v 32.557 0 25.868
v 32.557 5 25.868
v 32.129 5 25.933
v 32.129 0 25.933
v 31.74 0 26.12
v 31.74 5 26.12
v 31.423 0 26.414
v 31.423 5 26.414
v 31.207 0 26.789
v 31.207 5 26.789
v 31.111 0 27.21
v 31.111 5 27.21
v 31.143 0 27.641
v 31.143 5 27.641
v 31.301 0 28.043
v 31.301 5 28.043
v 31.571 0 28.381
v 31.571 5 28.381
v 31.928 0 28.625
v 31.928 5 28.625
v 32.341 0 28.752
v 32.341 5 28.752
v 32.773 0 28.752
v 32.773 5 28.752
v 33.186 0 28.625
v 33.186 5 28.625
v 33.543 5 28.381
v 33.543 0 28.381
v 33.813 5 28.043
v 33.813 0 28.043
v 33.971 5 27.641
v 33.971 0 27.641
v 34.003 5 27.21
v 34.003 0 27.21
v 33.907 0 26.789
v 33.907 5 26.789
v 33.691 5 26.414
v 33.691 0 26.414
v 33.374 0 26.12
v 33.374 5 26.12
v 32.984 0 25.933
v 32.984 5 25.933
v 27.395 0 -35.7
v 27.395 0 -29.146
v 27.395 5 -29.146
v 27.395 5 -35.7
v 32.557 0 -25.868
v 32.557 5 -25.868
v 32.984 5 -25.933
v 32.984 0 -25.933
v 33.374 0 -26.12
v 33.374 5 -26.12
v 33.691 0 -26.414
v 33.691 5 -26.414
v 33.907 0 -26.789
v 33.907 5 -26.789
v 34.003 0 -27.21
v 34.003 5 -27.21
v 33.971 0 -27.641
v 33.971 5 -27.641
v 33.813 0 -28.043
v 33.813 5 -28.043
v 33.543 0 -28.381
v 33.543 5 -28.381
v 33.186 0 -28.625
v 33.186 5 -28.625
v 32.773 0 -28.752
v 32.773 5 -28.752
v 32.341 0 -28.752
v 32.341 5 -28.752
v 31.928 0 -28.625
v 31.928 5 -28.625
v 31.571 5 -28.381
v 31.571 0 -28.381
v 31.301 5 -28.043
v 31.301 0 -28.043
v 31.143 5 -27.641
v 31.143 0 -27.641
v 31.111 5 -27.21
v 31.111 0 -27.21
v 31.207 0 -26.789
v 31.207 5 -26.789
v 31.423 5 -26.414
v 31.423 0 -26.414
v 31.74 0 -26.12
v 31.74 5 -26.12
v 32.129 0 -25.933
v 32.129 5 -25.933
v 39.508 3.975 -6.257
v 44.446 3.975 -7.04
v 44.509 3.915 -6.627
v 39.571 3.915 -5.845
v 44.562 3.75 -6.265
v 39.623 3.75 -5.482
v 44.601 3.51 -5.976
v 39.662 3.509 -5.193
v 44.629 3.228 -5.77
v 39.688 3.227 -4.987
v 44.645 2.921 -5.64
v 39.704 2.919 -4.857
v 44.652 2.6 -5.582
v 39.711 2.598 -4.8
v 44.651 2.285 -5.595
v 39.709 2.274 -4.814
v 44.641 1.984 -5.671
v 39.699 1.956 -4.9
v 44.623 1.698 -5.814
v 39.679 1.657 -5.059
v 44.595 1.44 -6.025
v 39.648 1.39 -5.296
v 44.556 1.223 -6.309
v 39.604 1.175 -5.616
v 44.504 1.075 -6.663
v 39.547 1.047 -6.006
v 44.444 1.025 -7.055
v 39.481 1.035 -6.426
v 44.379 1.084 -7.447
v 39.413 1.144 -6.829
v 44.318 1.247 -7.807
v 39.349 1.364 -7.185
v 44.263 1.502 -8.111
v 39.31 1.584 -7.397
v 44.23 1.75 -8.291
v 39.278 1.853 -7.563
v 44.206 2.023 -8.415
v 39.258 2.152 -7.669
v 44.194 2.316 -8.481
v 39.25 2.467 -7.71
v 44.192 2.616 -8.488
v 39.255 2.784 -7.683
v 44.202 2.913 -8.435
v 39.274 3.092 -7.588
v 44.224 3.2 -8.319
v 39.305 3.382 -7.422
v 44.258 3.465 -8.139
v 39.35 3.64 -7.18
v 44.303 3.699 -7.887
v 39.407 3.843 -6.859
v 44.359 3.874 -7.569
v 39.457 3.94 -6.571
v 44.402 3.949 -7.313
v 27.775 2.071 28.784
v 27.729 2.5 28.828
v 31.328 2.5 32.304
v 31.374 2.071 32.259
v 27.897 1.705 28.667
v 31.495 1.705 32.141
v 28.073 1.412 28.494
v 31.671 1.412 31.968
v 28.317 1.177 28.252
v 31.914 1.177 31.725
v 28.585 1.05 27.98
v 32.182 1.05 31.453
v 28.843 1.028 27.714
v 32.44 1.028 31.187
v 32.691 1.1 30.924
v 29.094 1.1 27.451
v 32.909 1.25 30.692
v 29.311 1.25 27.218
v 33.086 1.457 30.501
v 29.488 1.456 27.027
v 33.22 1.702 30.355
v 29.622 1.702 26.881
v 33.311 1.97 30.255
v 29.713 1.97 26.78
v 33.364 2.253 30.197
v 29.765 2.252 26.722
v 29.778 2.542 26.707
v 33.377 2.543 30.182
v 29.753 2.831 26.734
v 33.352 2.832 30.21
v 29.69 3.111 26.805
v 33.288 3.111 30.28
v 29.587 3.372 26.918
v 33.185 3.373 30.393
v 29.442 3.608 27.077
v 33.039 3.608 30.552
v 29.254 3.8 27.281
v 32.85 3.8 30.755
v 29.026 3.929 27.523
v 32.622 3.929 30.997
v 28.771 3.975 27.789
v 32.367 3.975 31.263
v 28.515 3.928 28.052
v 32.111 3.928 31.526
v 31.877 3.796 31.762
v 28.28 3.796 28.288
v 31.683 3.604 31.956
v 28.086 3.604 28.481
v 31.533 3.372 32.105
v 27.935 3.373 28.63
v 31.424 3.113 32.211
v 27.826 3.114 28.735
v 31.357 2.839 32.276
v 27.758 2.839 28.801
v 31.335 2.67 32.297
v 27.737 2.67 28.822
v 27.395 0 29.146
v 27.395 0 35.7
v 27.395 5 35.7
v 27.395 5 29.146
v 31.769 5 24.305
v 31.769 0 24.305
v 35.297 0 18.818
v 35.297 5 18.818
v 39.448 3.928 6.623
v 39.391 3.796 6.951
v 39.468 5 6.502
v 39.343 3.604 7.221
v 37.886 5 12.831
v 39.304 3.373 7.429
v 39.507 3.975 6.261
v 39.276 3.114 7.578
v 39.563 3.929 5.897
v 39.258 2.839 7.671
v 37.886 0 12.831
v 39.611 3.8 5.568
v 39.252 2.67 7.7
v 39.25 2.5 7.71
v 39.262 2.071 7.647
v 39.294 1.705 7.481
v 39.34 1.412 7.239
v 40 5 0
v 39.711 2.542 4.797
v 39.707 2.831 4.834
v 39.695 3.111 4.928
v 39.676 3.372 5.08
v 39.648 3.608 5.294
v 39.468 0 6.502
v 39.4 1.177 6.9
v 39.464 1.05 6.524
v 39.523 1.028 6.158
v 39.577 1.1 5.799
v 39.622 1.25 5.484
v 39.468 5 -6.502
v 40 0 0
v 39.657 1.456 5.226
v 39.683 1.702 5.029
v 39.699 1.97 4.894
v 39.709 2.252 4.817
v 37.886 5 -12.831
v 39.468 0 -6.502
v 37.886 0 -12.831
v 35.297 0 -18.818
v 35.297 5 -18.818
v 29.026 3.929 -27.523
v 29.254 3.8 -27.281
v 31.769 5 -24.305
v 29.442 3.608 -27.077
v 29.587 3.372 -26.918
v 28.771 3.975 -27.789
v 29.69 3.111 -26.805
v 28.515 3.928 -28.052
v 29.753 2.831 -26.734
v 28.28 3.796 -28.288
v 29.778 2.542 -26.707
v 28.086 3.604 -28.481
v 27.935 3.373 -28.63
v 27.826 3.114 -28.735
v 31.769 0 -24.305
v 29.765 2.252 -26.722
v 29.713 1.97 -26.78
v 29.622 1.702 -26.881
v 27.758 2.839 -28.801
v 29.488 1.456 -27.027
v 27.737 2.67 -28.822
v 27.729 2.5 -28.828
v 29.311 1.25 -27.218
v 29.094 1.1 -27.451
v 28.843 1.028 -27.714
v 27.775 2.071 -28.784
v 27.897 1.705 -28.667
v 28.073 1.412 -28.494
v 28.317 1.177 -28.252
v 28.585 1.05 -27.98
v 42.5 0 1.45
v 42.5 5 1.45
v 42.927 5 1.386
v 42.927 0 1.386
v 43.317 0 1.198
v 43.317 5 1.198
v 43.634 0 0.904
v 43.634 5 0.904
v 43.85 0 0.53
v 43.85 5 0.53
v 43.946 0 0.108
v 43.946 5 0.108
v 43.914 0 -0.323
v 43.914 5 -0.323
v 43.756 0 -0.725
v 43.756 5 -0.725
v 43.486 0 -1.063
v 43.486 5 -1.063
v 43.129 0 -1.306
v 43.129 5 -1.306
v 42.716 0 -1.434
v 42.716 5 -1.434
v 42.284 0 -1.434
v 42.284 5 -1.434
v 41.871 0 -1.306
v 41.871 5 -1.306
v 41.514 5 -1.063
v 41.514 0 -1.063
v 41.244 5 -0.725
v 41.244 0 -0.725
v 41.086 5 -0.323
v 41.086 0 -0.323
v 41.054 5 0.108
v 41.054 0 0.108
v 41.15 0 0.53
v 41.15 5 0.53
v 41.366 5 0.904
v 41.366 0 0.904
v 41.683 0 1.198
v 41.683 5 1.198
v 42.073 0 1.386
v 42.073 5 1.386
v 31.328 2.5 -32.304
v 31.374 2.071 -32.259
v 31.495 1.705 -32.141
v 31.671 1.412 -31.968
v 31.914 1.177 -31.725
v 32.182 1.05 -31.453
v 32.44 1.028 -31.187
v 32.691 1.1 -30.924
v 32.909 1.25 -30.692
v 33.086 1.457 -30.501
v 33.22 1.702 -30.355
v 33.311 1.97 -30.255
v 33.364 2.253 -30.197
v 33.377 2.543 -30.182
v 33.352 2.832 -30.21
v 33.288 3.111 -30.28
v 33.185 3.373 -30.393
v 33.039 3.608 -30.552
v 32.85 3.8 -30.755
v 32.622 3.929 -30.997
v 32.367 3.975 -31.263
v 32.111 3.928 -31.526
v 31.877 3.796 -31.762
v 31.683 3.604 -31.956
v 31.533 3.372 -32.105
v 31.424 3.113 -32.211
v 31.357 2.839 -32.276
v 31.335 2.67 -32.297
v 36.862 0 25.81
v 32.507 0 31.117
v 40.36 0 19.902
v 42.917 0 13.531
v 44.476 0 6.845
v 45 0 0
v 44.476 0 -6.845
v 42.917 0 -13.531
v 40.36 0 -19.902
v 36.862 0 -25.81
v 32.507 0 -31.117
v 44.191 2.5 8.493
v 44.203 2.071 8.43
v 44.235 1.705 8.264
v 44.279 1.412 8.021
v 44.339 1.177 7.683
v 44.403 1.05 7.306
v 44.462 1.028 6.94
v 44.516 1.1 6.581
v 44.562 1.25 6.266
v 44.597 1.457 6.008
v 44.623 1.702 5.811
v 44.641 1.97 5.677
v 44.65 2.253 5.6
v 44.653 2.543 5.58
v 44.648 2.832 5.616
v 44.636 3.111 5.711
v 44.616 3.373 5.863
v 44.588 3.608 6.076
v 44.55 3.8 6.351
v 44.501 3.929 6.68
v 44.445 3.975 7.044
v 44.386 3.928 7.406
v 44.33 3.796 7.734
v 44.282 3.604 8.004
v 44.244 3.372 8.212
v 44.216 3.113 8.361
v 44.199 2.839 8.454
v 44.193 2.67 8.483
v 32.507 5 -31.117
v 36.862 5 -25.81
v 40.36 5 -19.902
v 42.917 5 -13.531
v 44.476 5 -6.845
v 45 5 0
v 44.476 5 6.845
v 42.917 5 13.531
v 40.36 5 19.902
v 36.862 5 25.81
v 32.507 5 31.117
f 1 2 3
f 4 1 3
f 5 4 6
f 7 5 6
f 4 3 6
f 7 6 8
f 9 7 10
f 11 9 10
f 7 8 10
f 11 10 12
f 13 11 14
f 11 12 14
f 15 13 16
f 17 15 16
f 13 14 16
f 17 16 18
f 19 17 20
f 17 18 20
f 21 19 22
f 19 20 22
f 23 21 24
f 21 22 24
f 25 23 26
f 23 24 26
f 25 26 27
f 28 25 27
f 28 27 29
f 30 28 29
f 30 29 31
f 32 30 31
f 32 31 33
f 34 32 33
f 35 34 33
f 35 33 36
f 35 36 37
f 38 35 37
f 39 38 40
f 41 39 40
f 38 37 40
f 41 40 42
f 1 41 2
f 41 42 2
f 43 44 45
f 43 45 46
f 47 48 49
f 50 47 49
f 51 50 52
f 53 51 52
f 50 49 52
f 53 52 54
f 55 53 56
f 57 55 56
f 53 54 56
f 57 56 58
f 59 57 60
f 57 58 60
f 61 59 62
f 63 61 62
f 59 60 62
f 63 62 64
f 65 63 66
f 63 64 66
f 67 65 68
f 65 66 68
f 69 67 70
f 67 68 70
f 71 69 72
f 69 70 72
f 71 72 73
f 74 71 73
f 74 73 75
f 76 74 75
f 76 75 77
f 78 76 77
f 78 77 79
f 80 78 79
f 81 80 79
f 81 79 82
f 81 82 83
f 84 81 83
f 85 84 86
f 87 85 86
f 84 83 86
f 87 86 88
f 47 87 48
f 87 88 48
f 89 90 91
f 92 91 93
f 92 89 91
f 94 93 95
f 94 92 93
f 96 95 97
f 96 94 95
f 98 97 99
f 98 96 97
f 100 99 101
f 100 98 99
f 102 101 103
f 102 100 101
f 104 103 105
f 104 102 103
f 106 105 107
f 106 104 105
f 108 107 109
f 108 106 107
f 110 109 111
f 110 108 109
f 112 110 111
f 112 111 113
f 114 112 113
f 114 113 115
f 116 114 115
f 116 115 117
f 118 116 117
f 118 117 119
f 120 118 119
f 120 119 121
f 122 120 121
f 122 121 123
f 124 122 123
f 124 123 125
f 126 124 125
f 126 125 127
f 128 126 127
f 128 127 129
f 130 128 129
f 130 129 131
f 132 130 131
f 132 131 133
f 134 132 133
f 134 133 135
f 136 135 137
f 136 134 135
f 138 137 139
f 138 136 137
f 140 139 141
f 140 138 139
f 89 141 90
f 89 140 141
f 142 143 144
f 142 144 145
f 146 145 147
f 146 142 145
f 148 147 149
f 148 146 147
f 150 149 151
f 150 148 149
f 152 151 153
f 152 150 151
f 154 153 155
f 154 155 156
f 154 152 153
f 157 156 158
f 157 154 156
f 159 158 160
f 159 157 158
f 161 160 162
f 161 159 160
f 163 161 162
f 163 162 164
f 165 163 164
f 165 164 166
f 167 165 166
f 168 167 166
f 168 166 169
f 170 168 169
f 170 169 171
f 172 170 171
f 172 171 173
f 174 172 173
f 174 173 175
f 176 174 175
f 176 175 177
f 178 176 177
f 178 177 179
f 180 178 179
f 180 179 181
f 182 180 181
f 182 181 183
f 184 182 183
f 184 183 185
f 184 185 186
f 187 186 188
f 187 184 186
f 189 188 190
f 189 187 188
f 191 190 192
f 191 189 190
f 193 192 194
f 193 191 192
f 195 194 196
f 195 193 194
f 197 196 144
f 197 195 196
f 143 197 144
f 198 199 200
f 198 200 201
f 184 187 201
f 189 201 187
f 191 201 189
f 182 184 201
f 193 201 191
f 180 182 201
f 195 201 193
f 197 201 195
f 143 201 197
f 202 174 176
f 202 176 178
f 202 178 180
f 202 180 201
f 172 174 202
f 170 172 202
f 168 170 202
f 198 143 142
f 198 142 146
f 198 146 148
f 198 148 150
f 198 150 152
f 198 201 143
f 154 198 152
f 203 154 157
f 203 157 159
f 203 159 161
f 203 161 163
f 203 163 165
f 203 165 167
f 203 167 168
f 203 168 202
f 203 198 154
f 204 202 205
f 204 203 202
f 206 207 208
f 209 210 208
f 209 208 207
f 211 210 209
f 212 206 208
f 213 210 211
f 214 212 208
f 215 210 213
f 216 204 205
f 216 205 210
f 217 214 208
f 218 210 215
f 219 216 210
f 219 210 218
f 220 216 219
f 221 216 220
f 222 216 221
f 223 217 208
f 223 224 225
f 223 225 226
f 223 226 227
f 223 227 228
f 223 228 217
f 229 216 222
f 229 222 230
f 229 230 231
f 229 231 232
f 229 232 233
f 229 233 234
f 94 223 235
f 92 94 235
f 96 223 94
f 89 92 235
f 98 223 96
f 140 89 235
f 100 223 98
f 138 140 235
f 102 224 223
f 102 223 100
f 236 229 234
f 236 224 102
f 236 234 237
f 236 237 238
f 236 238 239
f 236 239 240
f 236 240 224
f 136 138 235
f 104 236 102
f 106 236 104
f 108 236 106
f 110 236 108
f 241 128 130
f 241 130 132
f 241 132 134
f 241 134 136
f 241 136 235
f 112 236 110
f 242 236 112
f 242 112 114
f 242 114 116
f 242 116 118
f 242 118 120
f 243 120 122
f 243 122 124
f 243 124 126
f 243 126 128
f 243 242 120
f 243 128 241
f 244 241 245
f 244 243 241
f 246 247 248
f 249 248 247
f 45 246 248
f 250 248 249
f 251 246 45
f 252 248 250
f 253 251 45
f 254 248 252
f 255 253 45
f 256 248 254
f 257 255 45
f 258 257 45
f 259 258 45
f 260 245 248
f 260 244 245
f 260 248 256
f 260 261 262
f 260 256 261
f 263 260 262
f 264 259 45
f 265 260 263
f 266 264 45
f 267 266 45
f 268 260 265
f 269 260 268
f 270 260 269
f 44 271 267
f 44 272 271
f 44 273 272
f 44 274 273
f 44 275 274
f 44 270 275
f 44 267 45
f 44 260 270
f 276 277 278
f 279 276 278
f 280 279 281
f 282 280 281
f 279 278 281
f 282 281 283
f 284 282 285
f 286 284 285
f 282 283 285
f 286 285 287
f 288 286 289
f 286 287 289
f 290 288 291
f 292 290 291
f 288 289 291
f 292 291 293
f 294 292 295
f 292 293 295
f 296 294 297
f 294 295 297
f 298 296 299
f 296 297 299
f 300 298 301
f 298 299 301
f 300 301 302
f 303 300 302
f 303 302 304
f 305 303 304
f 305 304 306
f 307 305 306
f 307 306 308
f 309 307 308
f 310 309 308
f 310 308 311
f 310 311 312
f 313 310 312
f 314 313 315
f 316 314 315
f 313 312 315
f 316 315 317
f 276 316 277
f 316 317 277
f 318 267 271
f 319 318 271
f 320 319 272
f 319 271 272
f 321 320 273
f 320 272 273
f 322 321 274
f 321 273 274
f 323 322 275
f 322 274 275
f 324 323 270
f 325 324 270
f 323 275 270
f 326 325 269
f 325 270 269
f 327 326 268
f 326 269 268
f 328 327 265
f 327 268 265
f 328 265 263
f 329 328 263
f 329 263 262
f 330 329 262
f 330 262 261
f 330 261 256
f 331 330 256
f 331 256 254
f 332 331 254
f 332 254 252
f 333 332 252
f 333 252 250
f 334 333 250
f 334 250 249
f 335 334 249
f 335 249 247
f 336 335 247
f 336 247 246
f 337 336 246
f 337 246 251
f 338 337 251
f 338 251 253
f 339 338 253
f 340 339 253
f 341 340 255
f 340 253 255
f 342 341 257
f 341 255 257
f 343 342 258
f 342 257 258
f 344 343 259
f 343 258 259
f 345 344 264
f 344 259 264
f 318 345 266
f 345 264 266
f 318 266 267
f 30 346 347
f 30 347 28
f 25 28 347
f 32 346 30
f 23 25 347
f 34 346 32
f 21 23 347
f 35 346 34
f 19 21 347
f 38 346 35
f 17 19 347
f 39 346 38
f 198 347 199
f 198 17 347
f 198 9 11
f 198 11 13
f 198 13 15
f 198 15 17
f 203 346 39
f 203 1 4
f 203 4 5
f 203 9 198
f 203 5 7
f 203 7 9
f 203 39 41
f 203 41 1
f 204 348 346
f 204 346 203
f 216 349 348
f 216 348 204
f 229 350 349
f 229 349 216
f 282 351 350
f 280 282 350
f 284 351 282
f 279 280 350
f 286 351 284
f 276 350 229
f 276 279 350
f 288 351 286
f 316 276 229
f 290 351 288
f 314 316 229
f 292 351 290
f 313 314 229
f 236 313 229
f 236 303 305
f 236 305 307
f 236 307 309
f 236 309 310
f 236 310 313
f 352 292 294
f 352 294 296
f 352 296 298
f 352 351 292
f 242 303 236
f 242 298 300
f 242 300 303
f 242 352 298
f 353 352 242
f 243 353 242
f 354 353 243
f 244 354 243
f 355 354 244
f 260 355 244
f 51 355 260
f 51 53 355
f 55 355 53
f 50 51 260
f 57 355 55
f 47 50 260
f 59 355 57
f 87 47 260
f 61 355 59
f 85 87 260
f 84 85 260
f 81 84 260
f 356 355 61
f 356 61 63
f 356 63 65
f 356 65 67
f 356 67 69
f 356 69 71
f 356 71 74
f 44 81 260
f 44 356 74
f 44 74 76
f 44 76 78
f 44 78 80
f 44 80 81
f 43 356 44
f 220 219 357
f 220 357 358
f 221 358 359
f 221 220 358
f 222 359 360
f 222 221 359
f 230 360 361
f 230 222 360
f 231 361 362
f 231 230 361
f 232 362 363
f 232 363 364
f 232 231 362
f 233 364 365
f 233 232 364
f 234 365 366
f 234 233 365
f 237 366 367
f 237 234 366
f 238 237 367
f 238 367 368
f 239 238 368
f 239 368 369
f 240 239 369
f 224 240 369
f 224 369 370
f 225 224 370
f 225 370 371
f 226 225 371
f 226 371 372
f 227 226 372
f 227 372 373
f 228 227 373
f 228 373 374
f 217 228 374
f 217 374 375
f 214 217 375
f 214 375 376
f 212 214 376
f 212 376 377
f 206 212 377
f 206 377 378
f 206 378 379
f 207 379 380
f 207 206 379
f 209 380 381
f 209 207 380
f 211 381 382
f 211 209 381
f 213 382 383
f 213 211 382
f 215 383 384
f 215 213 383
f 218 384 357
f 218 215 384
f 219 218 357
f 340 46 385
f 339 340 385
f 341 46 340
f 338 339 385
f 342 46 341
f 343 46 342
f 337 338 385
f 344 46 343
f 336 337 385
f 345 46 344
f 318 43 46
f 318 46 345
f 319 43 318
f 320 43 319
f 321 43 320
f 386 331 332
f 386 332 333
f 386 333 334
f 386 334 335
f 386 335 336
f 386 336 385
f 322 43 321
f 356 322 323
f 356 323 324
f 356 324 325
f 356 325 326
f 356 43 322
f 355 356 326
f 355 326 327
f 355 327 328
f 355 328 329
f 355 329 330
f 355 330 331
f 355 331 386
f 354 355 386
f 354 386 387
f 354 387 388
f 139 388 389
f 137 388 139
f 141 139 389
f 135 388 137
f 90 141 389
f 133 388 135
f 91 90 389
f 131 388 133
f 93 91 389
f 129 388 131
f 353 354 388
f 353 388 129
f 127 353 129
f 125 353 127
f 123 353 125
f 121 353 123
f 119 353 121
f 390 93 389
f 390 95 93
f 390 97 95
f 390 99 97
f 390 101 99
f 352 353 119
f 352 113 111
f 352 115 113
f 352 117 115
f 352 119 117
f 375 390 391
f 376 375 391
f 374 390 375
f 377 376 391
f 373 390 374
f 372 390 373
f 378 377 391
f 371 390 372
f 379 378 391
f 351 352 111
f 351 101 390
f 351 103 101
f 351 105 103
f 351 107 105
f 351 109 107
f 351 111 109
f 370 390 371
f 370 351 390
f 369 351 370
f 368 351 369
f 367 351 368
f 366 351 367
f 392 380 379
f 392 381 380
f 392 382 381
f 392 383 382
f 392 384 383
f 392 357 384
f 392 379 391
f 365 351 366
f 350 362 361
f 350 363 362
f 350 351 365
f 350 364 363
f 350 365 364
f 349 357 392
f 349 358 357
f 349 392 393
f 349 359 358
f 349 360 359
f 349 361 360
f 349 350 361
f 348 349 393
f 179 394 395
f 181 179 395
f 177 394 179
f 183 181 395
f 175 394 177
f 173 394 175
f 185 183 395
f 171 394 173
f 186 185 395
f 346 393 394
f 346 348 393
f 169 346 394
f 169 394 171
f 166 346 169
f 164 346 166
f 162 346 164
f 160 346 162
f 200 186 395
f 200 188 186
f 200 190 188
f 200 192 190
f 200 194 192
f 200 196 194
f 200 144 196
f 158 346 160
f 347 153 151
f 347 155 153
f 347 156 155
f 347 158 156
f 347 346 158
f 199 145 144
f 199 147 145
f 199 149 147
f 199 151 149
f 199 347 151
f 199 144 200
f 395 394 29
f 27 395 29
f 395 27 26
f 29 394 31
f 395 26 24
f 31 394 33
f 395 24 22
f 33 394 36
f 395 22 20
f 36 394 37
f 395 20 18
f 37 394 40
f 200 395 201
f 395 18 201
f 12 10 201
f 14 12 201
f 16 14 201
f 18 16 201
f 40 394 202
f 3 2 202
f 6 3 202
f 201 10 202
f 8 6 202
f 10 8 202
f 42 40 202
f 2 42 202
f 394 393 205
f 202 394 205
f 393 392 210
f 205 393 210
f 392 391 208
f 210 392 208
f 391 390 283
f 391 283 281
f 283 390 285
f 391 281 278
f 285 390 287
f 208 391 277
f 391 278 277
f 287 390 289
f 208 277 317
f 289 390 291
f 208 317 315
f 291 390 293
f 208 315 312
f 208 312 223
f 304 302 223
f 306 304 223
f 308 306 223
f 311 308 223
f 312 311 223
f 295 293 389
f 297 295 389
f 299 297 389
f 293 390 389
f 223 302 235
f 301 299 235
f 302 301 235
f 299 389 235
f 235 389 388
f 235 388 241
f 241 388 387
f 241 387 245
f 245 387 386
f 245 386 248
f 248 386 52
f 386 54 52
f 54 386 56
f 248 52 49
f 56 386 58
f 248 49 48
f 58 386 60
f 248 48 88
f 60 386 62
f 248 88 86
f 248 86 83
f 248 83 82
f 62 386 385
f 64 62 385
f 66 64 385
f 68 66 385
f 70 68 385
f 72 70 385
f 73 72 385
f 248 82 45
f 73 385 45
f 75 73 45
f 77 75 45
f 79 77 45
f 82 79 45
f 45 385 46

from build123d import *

# Parameters (mm, degrees)
EXTRUDE_1_DEPTH          = 5
SKETCH_2_R               = 1.45
CUT_EXTRUDE_1_DEPTH      = 5
SKETCH_3_R               = 1.475
CUT_EXTRUDE_2_DEPTH      = 46
PATTERN_CIRCULAR_1_COUNT = 2
PATTERN_CIRCULAR_1_ANGLE = 35
MIRROR_1_COPY_1_SKETCH_R = 1.475
MIRROR_1_COPY_1_DEPTH    = 46


with BuildPart() as part:
    # Эскиз1 → Бобышка-Вытянуть1 (new body)
    with BuildSketch(Plane(origin=(0, 0, 0), x_dir=(1, 0, 0), z_dir=(0, 1, 0))):
        with BuildLine():
            Line((27.395437576, 29.146011734), (27.395437576, 35.7))
            ThreePointArc((27.395437576, 35.7), (45, 0), (27.395437576, -35.7))
            Line((27.395437576, -35.7), (27.395437576, -29.146011734))
            ThreePointArc((27.395437576, -29.146011734), (40, 0), (27.395437576, 29.146011734))
        make_face()
    extrude(amount=EXTRUDE_1_DEPTH)

    # Эскиз2 → Вырез-Вытянуть1 (cut)
    with BuildSketch(Plane(origin=(0, 5, 0), x_dir=(1, 0, 0), z_dir=(0, 1, 0))):
        with Locations((42.5, 0)):
            Circle(SKETCH_2_R)
        with Locations((32.556888833, 27.318473412)):
            Circle(SKETCH_2_R)
        with Locations((32.556888833, -27.318473412)):
            Circle(SKETCH_2_R)
    extrude(amount=-CUT_EXTRUDE_1_DEPTH, mode=Mode.SUBTRACT)

    # Эскиз3 → Вырез-Вытянуть2 (cut)
    with BuildSketch(Plane(origin=(0, 0, 0), x_dir=(0, 1, 0), z_dir=(0.7193398003386524, 0, 0.6946583704589961))):
        with Locations((2.5, 0)):
            Circle(SKETCH_3_R)
    cut_extrude_2 = extrude(amount=CUT_EXTRUDE_2_DEPTH, mode=Mode.SUBTRACT)

    # Круговой массив1: Вырез-Вытянуть2 ×2 about axis
    pattern_circular_1_axis = Axis((0, -0.25, 0), (0, 1, 0))
    for i in range(1, PATTERN_CIRCULAR_1_COUNT):
        add(cut_extrude_2.rotate(pattern_circular_1_axis, i * PATTERN_CIRCULAR_1_ANGLE / (PATTERN_CIRCULAR_1_COUNT - 1)), mode=Mode.SUBTRACT)

    # Зеркальное отражение1: Вырез-Вытянуть2 across plane
    add(cut_extrude_2.mirror(Plane.XY), mode=Mode.SUBTRACT)

    # Зеркальное отражение1 copy 1 sketch → Зеркальное отражение1 copy 1 (cut)
    with BuildSketch(Plane(origin=(0, 0, 0), x_dir=(0, 1, 0), z_dir=(0.9876883405951382, 0, -0.15643446504022812))):
        with Locations((2.5, 0)):
            Circle(MIRROR_1_COPY_1_SKETCH_R)
    extrude(amount=MIRROR_1_COPY_1_DEPTH, mode=Mode.SUBTRACT)


solid = part.part
